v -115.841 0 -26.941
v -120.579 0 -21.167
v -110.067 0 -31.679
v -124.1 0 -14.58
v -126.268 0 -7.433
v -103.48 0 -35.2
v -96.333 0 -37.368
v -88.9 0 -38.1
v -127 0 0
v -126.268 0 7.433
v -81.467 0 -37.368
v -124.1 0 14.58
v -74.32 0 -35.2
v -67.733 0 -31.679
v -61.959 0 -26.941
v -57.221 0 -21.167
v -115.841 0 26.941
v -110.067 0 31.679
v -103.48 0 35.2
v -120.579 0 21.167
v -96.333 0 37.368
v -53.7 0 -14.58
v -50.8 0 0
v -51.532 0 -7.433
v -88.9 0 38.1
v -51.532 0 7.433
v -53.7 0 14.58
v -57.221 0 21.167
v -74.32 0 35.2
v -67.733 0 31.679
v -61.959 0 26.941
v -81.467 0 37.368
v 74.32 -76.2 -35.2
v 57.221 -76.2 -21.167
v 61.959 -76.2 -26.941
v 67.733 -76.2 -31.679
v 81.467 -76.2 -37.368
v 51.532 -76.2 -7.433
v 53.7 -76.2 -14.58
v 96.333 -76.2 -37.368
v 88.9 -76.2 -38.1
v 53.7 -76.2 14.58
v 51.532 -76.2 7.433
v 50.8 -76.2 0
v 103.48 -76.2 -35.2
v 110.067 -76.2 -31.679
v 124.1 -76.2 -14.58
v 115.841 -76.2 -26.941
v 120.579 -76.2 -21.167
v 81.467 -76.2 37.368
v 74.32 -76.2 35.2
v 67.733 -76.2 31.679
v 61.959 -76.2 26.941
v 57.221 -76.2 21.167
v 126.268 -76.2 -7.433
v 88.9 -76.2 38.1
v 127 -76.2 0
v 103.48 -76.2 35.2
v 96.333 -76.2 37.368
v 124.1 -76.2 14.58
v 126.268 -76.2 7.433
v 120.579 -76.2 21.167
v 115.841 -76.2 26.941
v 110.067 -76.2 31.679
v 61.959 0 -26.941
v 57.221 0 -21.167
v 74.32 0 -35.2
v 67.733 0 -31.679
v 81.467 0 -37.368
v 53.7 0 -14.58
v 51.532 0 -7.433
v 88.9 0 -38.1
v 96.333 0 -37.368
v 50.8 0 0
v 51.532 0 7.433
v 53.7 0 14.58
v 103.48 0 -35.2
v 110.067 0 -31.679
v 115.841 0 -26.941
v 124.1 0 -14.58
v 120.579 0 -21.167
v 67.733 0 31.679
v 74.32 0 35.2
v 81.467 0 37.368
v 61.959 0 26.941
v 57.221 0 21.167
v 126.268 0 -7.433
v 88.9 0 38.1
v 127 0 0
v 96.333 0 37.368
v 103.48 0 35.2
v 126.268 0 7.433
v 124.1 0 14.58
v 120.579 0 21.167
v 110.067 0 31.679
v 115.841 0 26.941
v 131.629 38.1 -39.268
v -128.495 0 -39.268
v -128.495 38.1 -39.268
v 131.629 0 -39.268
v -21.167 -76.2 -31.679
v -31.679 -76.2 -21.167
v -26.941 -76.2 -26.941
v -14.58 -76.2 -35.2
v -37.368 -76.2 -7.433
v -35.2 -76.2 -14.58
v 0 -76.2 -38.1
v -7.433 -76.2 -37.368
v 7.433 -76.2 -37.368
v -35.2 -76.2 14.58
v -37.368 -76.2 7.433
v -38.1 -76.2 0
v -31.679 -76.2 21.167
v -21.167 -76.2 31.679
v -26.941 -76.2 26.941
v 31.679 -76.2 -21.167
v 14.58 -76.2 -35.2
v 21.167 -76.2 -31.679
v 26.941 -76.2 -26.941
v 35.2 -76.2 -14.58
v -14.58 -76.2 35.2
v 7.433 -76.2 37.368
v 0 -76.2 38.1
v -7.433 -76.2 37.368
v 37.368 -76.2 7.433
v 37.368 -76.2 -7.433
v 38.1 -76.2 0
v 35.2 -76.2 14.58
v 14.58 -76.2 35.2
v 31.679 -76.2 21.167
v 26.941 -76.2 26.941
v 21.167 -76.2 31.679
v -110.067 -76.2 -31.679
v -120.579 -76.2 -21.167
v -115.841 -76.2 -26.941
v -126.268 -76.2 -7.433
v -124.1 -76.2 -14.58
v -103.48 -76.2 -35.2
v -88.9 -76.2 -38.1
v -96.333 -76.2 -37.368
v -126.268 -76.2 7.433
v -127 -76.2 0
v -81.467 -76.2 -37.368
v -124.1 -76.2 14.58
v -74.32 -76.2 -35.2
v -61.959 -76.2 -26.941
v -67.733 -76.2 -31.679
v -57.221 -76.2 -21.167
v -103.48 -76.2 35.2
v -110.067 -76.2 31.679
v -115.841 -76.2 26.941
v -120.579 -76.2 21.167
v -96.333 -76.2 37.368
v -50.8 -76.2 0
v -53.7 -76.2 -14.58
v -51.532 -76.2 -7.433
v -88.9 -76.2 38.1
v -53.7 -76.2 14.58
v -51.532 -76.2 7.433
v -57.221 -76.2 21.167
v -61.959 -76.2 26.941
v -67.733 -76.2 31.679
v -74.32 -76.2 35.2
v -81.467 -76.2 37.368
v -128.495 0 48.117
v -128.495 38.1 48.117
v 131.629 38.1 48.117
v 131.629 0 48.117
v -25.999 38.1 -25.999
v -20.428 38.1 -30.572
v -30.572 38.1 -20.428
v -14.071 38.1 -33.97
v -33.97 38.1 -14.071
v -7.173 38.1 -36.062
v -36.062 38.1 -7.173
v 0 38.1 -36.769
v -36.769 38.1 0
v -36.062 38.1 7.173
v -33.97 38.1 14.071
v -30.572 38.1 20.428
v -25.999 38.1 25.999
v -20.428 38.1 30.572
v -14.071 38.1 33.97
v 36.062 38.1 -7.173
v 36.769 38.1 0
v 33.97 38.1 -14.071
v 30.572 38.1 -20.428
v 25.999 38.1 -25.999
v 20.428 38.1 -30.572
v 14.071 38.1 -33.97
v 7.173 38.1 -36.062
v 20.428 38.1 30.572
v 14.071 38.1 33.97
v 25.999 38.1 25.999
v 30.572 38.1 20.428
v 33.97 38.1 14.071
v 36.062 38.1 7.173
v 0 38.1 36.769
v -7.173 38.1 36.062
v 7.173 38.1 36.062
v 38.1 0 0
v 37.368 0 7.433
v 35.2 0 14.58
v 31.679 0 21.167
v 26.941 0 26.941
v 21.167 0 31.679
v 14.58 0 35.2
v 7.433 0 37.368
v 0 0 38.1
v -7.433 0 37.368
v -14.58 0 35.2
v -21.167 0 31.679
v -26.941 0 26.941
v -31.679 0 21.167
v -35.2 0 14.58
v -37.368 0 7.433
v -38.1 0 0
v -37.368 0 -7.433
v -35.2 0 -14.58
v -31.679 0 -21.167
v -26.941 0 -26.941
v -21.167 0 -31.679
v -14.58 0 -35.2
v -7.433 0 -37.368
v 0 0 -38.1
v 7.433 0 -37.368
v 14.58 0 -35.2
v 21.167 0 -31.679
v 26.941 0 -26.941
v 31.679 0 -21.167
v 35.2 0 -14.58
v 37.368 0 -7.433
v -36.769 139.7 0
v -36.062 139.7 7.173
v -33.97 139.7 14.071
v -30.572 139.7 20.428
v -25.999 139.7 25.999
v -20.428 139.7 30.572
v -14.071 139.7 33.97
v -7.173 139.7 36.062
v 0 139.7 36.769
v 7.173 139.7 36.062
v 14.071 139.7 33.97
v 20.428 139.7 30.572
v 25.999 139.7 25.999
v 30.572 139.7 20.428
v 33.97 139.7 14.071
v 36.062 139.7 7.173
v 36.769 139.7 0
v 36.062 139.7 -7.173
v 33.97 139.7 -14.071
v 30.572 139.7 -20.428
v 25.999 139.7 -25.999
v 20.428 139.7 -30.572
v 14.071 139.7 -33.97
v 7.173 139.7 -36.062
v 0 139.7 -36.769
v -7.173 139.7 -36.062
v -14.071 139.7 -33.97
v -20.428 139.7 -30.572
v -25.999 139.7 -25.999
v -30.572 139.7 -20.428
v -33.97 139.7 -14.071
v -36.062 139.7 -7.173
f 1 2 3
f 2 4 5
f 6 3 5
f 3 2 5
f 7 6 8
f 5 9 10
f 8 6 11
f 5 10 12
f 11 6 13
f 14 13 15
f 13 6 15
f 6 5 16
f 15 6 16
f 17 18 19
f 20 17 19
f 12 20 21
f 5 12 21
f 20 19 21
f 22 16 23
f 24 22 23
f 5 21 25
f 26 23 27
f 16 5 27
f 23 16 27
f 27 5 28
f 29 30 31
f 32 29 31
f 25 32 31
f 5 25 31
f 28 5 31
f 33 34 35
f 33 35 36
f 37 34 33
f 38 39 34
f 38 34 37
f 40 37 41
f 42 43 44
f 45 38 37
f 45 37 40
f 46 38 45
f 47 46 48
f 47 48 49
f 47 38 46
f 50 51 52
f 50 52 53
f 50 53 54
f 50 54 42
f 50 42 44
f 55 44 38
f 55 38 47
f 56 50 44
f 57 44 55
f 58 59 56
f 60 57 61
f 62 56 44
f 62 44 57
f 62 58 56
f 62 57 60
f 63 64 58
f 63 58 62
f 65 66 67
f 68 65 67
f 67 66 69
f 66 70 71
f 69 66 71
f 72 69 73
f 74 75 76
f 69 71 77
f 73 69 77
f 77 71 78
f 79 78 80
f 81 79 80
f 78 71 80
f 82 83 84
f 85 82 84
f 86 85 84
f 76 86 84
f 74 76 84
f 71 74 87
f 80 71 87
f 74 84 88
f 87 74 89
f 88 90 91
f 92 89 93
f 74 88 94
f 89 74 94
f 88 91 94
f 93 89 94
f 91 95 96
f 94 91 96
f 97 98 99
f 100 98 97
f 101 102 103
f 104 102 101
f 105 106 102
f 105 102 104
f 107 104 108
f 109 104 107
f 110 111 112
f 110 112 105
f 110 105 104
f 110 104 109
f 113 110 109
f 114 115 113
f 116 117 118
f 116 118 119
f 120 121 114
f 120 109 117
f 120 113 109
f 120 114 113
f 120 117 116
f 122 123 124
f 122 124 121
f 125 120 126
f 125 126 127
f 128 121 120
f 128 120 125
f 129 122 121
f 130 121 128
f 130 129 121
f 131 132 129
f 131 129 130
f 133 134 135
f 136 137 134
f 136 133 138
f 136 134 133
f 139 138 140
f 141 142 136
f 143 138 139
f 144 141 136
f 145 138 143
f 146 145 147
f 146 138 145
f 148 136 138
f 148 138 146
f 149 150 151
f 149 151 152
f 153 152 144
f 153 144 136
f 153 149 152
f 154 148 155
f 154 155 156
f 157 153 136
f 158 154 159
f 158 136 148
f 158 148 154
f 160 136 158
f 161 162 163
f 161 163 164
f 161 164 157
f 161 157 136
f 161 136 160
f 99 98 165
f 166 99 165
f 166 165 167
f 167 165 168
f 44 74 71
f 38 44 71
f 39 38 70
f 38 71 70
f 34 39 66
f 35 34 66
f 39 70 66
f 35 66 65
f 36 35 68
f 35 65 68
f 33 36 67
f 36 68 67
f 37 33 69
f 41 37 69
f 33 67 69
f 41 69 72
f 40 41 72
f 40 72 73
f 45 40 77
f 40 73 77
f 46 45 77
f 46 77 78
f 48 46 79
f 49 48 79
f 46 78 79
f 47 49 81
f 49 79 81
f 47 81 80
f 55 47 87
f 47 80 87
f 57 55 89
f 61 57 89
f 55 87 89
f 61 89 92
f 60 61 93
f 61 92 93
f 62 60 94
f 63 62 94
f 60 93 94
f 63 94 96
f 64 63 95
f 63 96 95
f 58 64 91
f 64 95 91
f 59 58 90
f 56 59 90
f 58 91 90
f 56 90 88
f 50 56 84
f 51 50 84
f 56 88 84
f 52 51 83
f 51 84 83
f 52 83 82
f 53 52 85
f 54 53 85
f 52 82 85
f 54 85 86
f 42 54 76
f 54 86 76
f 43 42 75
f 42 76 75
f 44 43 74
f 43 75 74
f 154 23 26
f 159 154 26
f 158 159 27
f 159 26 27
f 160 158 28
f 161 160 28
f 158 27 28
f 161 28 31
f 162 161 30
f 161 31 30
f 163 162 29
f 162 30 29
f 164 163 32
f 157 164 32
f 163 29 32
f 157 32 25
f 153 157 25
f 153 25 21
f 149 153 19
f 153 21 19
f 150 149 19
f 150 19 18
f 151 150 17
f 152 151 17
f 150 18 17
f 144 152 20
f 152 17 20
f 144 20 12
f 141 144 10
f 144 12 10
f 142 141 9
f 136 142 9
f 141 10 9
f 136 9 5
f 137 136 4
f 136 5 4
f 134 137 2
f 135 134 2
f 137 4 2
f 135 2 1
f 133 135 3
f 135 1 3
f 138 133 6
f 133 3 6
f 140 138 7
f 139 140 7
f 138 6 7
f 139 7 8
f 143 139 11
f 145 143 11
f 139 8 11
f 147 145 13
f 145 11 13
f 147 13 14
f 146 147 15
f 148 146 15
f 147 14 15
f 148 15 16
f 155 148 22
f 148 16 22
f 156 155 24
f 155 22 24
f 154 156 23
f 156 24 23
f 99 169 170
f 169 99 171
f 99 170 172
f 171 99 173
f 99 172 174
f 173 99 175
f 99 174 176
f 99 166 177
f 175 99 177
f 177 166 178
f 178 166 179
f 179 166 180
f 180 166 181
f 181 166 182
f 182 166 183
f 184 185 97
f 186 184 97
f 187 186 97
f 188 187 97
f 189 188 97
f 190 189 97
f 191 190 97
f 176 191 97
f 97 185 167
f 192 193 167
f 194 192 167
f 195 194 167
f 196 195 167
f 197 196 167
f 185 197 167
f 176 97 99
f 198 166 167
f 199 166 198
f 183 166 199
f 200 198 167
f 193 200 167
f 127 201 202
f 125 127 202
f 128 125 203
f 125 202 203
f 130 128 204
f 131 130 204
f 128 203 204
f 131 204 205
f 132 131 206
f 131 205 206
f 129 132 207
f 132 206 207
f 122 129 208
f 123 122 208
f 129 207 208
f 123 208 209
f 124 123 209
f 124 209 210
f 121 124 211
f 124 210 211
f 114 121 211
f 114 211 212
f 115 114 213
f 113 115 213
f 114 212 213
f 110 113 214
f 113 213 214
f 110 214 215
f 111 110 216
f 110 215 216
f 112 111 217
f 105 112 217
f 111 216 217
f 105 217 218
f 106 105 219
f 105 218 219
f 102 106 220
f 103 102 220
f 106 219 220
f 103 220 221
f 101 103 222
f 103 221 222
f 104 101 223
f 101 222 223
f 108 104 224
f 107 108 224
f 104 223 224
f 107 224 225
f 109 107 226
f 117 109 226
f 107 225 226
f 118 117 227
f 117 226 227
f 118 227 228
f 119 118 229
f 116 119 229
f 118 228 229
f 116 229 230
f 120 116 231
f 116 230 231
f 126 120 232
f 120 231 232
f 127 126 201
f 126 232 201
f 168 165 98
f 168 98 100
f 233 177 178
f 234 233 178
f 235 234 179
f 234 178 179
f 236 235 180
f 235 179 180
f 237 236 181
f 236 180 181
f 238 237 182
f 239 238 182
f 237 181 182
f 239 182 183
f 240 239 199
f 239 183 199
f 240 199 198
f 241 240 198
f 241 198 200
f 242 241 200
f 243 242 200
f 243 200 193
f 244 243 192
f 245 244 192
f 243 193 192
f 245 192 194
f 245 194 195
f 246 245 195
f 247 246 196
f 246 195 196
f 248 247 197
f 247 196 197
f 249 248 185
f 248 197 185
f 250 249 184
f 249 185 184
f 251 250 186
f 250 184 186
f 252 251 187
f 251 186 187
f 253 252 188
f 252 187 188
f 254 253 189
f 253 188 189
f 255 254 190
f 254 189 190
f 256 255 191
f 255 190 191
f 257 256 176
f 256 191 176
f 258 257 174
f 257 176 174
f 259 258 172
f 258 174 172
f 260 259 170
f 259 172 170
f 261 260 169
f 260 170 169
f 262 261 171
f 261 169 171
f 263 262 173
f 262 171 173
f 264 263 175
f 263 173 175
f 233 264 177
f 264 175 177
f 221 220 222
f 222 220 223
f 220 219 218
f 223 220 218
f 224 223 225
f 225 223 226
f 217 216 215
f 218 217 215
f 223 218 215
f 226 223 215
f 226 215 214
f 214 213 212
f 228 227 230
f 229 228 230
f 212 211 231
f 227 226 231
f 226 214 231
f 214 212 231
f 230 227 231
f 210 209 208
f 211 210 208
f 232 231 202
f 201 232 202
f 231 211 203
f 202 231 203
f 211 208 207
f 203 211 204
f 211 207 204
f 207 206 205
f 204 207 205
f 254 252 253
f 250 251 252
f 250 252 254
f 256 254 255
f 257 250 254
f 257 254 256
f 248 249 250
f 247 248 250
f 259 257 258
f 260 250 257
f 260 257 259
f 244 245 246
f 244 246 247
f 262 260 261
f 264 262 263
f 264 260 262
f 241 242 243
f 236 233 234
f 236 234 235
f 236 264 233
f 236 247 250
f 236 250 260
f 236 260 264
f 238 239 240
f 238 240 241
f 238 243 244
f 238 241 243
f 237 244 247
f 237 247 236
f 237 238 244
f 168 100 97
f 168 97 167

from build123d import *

# Parameters (mm, degrees)
F0_R     = 38.1
F1_DEPTH = 76.2
F2_W     = 260.124684
F2_H     = 87.384194
F3_DEPTH = 38.1
F4_R     = 36.768627
F5_DEPTH = 101.6


with BuildPart() as f1:
    # F0 (on Front) → F1 (new body)
    with BuildSketch(Plane.XZ):
        with BuildLine():
            ThreePointArc((-38.1, 0), (0, -38.1), (38.1, 0))
            ThreePointArc((38.1, 0), (0, 38.1), (-38.1, 0))
        make_face()
        with Locations((-88.9, 0)):
            Circle(F0_R)
        with BuildLine():
            ThreePointArc((127, 0), (88.9, 38.1), (50.8, 0))
            ThreePointArc((50.8, 0), (88.9, -38.1), (127, 0))
        make_face()
    extrude(amount=F1_DEPTH)


with BuildPart() as f3:
    # F2 (on Front) → F3 (new body)
    with BuildSketch(Plane.XZ):
        with Locations((1.567021, 4.424516)):
            Rectangle(F2_W, F2_H)
    extrude(amount=-F3_DEPTH)

    # F4 (on face) → F5 (join)
    with BuildSketch(Plane(origin=(0, 38.1, 0), x_dir=(-1, 0, 0), z_dir=(0, 1, 0))):
        Circle(F4_R)
    extrude(amount=F5_DEPTH)


solid = Compound([f1.part, f3.part])
